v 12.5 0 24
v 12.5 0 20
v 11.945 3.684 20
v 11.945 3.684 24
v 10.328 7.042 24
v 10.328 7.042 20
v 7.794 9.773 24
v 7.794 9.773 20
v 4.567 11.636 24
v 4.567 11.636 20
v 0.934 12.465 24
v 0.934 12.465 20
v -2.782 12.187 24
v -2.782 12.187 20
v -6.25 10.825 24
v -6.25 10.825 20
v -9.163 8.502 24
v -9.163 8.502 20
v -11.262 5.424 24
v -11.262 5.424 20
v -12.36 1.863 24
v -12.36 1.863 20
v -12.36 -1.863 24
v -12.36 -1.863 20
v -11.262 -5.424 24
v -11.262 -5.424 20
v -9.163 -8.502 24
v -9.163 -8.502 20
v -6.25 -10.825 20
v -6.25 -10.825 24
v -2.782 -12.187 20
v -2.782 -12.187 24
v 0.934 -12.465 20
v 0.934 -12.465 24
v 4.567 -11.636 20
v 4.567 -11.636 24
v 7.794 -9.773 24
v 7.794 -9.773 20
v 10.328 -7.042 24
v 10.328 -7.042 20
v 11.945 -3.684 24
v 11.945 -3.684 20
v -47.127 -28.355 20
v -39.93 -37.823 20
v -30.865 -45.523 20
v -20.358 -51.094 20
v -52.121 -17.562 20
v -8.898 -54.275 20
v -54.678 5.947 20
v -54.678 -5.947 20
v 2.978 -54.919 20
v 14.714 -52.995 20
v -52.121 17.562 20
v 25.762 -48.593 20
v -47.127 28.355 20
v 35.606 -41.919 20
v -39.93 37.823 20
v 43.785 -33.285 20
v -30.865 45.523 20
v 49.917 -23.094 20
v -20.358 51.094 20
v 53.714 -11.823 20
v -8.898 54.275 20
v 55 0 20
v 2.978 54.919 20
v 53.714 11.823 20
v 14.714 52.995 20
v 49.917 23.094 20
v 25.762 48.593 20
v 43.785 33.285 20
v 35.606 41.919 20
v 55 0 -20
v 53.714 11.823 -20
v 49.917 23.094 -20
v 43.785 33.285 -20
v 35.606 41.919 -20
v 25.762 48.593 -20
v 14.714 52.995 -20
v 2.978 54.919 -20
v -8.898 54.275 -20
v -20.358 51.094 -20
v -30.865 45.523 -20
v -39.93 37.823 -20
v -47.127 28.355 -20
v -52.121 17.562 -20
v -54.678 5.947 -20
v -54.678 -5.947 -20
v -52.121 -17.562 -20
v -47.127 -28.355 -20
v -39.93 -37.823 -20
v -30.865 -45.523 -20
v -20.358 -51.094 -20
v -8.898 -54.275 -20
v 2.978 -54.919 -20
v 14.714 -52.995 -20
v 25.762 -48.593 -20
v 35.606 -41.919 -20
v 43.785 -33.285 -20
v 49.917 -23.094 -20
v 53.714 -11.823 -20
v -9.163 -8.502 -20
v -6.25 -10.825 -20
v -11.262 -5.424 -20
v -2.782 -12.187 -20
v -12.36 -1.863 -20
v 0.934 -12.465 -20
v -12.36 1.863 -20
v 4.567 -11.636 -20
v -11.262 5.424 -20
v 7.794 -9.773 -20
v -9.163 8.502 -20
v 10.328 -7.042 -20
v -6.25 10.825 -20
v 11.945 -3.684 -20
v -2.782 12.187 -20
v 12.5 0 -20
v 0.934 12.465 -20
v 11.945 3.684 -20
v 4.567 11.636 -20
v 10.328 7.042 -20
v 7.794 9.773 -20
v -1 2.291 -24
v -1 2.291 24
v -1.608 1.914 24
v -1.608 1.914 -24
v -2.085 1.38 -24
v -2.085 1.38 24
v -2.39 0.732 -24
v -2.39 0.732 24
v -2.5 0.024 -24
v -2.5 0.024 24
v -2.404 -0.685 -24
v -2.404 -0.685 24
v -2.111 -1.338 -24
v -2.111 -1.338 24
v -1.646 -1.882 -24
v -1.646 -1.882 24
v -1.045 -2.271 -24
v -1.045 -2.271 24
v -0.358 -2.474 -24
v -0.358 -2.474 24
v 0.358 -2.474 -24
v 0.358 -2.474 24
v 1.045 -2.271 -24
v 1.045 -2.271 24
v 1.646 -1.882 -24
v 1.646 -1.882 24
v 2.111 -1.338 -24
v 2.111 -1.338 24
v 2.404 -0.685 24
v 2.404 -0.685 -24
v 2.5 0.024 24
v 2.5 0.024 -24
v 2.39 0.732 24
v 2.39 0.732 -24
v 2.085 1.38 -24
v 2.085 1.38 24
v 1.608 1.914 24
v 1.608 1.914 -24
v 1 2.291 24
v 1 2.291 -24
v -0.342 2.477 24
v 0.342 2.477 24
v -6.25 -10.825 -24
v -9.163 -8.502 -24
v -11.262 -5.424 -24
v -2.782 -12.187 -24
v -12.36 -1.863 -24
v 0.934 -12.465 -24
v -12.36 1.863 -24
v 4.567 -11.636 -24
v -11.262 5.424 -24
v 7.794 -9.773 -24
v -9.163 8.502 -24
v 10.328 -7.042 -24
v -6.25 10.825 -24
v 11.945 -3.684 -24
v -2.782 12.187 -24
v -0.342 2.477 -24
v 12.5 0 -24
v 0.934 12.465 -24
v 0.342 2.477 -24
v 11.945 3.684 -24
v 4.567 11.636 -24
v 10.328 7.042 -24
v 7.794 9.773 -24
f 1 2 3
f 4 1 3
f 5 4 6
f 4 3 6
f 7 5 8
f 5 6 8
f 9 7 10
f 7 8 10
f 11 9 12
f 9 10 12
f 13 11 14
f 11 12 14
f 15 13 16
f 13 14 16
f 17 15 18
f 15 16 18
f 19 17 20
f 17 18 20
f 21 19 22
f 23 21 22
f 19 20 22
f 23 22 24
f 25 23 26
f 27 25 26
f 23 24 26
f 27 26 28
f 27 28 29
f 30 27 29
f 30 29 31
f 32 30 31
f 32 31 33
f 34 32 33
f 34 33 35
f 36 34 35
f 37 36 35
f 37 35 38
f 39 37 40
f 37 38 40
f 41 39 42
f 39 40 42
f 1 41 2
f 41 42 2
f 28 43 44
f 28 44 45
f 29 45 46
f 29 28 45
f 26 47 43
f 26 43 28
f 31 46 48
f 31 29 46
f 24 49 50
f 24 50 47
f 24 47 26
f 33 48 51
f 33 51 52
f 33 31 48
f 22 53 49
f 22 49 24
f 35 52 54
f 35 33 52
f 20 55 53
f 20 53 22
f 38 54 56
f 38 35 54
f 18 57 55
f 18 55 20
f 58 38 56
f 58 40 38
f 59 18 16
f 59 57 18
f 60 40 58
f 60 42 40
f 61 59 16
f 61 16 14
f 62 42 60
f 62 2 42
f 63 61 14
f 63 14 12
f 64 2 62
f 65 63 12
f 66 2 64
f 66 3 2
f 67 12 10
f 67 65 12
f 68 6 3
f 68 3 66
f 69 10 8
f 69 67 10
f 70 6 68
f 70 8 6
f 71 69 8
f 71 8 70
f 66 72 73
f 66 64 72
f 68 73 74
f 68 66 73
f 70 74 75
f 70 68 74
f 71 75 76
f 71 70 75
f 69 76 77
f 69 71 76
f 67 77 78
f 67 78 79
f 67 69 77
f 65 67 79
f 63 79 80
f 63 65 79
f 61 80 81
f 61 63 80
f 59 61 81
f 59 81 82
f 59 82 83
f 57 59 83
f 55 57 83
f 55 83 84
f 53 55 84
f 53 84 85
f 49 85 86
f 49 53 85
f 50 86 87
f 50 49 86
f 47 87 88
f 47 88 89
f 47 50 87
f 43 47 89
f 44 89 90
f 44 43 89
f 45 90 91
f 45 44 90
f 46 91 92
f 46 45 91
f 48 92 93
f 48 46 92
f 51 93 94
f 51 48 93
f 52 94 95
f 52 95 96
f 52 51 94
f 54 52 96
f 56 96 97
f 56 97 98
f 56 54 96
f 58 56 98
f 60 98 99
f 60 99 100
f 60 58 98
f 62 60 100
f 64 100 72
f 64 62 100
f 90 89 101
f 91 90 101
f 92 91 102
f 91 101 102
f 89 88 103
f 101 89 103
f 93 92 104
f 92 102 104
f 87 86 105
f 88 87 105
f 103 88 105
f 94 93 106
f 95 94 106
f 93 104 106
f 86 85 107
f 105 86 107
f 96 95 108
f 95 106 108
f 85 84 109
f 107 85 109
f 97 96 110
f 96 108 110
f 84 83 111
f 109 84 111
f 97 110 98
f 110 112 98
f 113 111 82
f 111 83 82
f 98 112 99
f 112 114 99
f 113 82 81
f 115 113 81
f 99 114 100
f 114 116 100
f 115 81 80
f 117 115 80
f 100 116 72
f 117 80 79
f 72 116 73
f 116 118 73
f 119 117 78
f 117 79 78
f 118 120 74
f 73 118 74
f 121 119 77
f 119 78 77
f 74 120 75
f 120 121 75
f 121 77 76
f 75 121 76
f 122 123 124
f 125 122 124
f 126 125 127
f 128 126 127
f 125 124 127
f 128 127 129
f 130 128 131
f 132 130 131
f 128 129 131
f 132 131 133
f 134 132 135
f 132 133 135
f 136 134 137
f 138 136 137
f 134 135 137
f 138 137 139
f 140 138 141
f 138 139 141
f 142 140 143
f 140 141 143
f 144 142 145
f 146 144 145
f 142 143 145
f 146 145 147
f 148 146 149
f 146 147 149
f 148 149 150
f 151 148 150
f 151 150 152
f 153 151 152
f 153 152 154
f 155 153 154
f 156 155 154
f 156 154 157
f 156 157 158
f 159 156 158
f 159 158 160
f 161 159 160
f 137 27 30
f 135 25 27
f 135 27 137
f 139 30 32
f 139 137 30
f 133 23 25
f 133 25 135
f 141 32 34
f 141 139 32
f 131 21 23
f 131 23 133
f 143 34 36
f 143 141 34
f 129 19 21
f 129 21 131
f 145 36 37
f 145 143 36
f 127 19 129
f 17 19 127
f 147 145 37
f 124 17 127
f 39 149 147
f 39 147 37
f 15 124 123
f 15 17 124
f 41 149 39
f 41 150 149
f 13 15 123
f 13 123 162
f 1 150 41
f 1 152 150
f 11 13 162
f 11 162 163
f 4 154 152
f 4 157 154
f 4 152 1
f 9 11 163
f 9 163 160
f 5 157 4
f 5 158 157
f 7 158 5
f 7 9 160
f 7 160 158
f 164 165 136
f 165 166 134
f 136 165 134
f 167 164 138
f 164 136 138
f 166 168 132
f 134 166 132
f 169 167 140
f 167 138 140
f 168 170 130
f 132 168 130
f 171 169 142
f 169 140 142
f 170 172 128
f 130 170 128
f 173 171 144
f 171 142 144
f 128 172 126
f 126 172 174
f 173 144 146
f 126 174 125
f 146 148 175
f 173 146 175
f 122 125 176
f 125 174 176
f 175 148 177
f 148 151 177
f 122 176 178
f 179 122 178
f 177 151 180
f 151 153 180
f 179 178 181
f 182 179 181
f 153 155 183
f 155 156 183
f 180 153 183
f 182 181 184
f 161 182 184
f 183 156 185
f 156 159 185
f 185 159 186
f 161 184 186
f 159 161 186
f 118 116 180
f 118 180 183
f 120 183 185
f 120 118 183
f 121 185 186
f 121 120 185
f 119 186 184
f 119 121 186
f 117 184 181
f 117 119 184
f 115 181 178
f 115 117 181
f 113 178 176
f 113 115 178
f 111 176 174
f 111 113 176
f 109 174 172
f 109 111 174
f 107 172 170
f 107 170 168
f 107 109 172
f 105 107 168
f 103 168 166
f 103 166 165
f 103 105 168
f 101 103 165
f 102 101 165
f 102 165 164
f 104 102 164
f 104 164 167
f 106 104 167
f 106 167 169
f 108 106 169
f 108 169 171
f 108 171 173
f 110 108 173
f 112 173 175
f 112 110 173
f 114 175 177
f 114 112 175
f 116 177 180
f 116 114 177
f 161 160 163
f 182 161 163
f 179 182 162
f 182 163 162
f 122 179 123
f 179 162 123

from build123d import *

# Parameters (mm, degrees)
SKETCH1_R           = 55
BOSS_EXTRUDE1_DEPTH = 20
SKETCH2_R           = 12.5
BOSS_EXTRUDE2_DEPTH = 4
KEYWAY_DEPTH        = 97.269852921


with BuildPart() as part:
    # Sketch1 → Boss-Extrude1 (new, symmetric)
    with BuildSketch(Plane.XY):
        Circle(SKETCH1_R)
    extrude(amount=BOSS_EXTRUDE1_DEPTH, both=True)

    # Sketch2 → Boss-Extrude2 (add)
    with BuildSketch(Plane.XY.offset(20)):
        Circle(SKETCH2_R)
    boss_extrude2 = extrude(amount=BOSS_EXTRUDE2_DEPTH)

    # Mirror1: Boss-Extrude2 across plane
    add(boss_extrude2.mirror(Plane.XY))

    # KeySketch → Keyway (cut, through all)
    with BuildSketch(Plane(origin=(6.62471706, 1.269697251, 24), x_dir=(1, 0, 0), z_dir=(0, 0, 1))):
        with BuildLine():
            ThreePointArc((-7.62471706, 1.021590597), (-6.62471706, -3.769697251), (-5.62471706, 1.021590597))
            ThreePointArc((-5.62471706, 1.021590597), (-6.62471706, 1.230302749), (-7.62471706, 1.021590597))
        make_face()
    extrude(amount=-KEYWAY_DEPTH, mode=Mode.SUBTRACT)


solid = part.part
